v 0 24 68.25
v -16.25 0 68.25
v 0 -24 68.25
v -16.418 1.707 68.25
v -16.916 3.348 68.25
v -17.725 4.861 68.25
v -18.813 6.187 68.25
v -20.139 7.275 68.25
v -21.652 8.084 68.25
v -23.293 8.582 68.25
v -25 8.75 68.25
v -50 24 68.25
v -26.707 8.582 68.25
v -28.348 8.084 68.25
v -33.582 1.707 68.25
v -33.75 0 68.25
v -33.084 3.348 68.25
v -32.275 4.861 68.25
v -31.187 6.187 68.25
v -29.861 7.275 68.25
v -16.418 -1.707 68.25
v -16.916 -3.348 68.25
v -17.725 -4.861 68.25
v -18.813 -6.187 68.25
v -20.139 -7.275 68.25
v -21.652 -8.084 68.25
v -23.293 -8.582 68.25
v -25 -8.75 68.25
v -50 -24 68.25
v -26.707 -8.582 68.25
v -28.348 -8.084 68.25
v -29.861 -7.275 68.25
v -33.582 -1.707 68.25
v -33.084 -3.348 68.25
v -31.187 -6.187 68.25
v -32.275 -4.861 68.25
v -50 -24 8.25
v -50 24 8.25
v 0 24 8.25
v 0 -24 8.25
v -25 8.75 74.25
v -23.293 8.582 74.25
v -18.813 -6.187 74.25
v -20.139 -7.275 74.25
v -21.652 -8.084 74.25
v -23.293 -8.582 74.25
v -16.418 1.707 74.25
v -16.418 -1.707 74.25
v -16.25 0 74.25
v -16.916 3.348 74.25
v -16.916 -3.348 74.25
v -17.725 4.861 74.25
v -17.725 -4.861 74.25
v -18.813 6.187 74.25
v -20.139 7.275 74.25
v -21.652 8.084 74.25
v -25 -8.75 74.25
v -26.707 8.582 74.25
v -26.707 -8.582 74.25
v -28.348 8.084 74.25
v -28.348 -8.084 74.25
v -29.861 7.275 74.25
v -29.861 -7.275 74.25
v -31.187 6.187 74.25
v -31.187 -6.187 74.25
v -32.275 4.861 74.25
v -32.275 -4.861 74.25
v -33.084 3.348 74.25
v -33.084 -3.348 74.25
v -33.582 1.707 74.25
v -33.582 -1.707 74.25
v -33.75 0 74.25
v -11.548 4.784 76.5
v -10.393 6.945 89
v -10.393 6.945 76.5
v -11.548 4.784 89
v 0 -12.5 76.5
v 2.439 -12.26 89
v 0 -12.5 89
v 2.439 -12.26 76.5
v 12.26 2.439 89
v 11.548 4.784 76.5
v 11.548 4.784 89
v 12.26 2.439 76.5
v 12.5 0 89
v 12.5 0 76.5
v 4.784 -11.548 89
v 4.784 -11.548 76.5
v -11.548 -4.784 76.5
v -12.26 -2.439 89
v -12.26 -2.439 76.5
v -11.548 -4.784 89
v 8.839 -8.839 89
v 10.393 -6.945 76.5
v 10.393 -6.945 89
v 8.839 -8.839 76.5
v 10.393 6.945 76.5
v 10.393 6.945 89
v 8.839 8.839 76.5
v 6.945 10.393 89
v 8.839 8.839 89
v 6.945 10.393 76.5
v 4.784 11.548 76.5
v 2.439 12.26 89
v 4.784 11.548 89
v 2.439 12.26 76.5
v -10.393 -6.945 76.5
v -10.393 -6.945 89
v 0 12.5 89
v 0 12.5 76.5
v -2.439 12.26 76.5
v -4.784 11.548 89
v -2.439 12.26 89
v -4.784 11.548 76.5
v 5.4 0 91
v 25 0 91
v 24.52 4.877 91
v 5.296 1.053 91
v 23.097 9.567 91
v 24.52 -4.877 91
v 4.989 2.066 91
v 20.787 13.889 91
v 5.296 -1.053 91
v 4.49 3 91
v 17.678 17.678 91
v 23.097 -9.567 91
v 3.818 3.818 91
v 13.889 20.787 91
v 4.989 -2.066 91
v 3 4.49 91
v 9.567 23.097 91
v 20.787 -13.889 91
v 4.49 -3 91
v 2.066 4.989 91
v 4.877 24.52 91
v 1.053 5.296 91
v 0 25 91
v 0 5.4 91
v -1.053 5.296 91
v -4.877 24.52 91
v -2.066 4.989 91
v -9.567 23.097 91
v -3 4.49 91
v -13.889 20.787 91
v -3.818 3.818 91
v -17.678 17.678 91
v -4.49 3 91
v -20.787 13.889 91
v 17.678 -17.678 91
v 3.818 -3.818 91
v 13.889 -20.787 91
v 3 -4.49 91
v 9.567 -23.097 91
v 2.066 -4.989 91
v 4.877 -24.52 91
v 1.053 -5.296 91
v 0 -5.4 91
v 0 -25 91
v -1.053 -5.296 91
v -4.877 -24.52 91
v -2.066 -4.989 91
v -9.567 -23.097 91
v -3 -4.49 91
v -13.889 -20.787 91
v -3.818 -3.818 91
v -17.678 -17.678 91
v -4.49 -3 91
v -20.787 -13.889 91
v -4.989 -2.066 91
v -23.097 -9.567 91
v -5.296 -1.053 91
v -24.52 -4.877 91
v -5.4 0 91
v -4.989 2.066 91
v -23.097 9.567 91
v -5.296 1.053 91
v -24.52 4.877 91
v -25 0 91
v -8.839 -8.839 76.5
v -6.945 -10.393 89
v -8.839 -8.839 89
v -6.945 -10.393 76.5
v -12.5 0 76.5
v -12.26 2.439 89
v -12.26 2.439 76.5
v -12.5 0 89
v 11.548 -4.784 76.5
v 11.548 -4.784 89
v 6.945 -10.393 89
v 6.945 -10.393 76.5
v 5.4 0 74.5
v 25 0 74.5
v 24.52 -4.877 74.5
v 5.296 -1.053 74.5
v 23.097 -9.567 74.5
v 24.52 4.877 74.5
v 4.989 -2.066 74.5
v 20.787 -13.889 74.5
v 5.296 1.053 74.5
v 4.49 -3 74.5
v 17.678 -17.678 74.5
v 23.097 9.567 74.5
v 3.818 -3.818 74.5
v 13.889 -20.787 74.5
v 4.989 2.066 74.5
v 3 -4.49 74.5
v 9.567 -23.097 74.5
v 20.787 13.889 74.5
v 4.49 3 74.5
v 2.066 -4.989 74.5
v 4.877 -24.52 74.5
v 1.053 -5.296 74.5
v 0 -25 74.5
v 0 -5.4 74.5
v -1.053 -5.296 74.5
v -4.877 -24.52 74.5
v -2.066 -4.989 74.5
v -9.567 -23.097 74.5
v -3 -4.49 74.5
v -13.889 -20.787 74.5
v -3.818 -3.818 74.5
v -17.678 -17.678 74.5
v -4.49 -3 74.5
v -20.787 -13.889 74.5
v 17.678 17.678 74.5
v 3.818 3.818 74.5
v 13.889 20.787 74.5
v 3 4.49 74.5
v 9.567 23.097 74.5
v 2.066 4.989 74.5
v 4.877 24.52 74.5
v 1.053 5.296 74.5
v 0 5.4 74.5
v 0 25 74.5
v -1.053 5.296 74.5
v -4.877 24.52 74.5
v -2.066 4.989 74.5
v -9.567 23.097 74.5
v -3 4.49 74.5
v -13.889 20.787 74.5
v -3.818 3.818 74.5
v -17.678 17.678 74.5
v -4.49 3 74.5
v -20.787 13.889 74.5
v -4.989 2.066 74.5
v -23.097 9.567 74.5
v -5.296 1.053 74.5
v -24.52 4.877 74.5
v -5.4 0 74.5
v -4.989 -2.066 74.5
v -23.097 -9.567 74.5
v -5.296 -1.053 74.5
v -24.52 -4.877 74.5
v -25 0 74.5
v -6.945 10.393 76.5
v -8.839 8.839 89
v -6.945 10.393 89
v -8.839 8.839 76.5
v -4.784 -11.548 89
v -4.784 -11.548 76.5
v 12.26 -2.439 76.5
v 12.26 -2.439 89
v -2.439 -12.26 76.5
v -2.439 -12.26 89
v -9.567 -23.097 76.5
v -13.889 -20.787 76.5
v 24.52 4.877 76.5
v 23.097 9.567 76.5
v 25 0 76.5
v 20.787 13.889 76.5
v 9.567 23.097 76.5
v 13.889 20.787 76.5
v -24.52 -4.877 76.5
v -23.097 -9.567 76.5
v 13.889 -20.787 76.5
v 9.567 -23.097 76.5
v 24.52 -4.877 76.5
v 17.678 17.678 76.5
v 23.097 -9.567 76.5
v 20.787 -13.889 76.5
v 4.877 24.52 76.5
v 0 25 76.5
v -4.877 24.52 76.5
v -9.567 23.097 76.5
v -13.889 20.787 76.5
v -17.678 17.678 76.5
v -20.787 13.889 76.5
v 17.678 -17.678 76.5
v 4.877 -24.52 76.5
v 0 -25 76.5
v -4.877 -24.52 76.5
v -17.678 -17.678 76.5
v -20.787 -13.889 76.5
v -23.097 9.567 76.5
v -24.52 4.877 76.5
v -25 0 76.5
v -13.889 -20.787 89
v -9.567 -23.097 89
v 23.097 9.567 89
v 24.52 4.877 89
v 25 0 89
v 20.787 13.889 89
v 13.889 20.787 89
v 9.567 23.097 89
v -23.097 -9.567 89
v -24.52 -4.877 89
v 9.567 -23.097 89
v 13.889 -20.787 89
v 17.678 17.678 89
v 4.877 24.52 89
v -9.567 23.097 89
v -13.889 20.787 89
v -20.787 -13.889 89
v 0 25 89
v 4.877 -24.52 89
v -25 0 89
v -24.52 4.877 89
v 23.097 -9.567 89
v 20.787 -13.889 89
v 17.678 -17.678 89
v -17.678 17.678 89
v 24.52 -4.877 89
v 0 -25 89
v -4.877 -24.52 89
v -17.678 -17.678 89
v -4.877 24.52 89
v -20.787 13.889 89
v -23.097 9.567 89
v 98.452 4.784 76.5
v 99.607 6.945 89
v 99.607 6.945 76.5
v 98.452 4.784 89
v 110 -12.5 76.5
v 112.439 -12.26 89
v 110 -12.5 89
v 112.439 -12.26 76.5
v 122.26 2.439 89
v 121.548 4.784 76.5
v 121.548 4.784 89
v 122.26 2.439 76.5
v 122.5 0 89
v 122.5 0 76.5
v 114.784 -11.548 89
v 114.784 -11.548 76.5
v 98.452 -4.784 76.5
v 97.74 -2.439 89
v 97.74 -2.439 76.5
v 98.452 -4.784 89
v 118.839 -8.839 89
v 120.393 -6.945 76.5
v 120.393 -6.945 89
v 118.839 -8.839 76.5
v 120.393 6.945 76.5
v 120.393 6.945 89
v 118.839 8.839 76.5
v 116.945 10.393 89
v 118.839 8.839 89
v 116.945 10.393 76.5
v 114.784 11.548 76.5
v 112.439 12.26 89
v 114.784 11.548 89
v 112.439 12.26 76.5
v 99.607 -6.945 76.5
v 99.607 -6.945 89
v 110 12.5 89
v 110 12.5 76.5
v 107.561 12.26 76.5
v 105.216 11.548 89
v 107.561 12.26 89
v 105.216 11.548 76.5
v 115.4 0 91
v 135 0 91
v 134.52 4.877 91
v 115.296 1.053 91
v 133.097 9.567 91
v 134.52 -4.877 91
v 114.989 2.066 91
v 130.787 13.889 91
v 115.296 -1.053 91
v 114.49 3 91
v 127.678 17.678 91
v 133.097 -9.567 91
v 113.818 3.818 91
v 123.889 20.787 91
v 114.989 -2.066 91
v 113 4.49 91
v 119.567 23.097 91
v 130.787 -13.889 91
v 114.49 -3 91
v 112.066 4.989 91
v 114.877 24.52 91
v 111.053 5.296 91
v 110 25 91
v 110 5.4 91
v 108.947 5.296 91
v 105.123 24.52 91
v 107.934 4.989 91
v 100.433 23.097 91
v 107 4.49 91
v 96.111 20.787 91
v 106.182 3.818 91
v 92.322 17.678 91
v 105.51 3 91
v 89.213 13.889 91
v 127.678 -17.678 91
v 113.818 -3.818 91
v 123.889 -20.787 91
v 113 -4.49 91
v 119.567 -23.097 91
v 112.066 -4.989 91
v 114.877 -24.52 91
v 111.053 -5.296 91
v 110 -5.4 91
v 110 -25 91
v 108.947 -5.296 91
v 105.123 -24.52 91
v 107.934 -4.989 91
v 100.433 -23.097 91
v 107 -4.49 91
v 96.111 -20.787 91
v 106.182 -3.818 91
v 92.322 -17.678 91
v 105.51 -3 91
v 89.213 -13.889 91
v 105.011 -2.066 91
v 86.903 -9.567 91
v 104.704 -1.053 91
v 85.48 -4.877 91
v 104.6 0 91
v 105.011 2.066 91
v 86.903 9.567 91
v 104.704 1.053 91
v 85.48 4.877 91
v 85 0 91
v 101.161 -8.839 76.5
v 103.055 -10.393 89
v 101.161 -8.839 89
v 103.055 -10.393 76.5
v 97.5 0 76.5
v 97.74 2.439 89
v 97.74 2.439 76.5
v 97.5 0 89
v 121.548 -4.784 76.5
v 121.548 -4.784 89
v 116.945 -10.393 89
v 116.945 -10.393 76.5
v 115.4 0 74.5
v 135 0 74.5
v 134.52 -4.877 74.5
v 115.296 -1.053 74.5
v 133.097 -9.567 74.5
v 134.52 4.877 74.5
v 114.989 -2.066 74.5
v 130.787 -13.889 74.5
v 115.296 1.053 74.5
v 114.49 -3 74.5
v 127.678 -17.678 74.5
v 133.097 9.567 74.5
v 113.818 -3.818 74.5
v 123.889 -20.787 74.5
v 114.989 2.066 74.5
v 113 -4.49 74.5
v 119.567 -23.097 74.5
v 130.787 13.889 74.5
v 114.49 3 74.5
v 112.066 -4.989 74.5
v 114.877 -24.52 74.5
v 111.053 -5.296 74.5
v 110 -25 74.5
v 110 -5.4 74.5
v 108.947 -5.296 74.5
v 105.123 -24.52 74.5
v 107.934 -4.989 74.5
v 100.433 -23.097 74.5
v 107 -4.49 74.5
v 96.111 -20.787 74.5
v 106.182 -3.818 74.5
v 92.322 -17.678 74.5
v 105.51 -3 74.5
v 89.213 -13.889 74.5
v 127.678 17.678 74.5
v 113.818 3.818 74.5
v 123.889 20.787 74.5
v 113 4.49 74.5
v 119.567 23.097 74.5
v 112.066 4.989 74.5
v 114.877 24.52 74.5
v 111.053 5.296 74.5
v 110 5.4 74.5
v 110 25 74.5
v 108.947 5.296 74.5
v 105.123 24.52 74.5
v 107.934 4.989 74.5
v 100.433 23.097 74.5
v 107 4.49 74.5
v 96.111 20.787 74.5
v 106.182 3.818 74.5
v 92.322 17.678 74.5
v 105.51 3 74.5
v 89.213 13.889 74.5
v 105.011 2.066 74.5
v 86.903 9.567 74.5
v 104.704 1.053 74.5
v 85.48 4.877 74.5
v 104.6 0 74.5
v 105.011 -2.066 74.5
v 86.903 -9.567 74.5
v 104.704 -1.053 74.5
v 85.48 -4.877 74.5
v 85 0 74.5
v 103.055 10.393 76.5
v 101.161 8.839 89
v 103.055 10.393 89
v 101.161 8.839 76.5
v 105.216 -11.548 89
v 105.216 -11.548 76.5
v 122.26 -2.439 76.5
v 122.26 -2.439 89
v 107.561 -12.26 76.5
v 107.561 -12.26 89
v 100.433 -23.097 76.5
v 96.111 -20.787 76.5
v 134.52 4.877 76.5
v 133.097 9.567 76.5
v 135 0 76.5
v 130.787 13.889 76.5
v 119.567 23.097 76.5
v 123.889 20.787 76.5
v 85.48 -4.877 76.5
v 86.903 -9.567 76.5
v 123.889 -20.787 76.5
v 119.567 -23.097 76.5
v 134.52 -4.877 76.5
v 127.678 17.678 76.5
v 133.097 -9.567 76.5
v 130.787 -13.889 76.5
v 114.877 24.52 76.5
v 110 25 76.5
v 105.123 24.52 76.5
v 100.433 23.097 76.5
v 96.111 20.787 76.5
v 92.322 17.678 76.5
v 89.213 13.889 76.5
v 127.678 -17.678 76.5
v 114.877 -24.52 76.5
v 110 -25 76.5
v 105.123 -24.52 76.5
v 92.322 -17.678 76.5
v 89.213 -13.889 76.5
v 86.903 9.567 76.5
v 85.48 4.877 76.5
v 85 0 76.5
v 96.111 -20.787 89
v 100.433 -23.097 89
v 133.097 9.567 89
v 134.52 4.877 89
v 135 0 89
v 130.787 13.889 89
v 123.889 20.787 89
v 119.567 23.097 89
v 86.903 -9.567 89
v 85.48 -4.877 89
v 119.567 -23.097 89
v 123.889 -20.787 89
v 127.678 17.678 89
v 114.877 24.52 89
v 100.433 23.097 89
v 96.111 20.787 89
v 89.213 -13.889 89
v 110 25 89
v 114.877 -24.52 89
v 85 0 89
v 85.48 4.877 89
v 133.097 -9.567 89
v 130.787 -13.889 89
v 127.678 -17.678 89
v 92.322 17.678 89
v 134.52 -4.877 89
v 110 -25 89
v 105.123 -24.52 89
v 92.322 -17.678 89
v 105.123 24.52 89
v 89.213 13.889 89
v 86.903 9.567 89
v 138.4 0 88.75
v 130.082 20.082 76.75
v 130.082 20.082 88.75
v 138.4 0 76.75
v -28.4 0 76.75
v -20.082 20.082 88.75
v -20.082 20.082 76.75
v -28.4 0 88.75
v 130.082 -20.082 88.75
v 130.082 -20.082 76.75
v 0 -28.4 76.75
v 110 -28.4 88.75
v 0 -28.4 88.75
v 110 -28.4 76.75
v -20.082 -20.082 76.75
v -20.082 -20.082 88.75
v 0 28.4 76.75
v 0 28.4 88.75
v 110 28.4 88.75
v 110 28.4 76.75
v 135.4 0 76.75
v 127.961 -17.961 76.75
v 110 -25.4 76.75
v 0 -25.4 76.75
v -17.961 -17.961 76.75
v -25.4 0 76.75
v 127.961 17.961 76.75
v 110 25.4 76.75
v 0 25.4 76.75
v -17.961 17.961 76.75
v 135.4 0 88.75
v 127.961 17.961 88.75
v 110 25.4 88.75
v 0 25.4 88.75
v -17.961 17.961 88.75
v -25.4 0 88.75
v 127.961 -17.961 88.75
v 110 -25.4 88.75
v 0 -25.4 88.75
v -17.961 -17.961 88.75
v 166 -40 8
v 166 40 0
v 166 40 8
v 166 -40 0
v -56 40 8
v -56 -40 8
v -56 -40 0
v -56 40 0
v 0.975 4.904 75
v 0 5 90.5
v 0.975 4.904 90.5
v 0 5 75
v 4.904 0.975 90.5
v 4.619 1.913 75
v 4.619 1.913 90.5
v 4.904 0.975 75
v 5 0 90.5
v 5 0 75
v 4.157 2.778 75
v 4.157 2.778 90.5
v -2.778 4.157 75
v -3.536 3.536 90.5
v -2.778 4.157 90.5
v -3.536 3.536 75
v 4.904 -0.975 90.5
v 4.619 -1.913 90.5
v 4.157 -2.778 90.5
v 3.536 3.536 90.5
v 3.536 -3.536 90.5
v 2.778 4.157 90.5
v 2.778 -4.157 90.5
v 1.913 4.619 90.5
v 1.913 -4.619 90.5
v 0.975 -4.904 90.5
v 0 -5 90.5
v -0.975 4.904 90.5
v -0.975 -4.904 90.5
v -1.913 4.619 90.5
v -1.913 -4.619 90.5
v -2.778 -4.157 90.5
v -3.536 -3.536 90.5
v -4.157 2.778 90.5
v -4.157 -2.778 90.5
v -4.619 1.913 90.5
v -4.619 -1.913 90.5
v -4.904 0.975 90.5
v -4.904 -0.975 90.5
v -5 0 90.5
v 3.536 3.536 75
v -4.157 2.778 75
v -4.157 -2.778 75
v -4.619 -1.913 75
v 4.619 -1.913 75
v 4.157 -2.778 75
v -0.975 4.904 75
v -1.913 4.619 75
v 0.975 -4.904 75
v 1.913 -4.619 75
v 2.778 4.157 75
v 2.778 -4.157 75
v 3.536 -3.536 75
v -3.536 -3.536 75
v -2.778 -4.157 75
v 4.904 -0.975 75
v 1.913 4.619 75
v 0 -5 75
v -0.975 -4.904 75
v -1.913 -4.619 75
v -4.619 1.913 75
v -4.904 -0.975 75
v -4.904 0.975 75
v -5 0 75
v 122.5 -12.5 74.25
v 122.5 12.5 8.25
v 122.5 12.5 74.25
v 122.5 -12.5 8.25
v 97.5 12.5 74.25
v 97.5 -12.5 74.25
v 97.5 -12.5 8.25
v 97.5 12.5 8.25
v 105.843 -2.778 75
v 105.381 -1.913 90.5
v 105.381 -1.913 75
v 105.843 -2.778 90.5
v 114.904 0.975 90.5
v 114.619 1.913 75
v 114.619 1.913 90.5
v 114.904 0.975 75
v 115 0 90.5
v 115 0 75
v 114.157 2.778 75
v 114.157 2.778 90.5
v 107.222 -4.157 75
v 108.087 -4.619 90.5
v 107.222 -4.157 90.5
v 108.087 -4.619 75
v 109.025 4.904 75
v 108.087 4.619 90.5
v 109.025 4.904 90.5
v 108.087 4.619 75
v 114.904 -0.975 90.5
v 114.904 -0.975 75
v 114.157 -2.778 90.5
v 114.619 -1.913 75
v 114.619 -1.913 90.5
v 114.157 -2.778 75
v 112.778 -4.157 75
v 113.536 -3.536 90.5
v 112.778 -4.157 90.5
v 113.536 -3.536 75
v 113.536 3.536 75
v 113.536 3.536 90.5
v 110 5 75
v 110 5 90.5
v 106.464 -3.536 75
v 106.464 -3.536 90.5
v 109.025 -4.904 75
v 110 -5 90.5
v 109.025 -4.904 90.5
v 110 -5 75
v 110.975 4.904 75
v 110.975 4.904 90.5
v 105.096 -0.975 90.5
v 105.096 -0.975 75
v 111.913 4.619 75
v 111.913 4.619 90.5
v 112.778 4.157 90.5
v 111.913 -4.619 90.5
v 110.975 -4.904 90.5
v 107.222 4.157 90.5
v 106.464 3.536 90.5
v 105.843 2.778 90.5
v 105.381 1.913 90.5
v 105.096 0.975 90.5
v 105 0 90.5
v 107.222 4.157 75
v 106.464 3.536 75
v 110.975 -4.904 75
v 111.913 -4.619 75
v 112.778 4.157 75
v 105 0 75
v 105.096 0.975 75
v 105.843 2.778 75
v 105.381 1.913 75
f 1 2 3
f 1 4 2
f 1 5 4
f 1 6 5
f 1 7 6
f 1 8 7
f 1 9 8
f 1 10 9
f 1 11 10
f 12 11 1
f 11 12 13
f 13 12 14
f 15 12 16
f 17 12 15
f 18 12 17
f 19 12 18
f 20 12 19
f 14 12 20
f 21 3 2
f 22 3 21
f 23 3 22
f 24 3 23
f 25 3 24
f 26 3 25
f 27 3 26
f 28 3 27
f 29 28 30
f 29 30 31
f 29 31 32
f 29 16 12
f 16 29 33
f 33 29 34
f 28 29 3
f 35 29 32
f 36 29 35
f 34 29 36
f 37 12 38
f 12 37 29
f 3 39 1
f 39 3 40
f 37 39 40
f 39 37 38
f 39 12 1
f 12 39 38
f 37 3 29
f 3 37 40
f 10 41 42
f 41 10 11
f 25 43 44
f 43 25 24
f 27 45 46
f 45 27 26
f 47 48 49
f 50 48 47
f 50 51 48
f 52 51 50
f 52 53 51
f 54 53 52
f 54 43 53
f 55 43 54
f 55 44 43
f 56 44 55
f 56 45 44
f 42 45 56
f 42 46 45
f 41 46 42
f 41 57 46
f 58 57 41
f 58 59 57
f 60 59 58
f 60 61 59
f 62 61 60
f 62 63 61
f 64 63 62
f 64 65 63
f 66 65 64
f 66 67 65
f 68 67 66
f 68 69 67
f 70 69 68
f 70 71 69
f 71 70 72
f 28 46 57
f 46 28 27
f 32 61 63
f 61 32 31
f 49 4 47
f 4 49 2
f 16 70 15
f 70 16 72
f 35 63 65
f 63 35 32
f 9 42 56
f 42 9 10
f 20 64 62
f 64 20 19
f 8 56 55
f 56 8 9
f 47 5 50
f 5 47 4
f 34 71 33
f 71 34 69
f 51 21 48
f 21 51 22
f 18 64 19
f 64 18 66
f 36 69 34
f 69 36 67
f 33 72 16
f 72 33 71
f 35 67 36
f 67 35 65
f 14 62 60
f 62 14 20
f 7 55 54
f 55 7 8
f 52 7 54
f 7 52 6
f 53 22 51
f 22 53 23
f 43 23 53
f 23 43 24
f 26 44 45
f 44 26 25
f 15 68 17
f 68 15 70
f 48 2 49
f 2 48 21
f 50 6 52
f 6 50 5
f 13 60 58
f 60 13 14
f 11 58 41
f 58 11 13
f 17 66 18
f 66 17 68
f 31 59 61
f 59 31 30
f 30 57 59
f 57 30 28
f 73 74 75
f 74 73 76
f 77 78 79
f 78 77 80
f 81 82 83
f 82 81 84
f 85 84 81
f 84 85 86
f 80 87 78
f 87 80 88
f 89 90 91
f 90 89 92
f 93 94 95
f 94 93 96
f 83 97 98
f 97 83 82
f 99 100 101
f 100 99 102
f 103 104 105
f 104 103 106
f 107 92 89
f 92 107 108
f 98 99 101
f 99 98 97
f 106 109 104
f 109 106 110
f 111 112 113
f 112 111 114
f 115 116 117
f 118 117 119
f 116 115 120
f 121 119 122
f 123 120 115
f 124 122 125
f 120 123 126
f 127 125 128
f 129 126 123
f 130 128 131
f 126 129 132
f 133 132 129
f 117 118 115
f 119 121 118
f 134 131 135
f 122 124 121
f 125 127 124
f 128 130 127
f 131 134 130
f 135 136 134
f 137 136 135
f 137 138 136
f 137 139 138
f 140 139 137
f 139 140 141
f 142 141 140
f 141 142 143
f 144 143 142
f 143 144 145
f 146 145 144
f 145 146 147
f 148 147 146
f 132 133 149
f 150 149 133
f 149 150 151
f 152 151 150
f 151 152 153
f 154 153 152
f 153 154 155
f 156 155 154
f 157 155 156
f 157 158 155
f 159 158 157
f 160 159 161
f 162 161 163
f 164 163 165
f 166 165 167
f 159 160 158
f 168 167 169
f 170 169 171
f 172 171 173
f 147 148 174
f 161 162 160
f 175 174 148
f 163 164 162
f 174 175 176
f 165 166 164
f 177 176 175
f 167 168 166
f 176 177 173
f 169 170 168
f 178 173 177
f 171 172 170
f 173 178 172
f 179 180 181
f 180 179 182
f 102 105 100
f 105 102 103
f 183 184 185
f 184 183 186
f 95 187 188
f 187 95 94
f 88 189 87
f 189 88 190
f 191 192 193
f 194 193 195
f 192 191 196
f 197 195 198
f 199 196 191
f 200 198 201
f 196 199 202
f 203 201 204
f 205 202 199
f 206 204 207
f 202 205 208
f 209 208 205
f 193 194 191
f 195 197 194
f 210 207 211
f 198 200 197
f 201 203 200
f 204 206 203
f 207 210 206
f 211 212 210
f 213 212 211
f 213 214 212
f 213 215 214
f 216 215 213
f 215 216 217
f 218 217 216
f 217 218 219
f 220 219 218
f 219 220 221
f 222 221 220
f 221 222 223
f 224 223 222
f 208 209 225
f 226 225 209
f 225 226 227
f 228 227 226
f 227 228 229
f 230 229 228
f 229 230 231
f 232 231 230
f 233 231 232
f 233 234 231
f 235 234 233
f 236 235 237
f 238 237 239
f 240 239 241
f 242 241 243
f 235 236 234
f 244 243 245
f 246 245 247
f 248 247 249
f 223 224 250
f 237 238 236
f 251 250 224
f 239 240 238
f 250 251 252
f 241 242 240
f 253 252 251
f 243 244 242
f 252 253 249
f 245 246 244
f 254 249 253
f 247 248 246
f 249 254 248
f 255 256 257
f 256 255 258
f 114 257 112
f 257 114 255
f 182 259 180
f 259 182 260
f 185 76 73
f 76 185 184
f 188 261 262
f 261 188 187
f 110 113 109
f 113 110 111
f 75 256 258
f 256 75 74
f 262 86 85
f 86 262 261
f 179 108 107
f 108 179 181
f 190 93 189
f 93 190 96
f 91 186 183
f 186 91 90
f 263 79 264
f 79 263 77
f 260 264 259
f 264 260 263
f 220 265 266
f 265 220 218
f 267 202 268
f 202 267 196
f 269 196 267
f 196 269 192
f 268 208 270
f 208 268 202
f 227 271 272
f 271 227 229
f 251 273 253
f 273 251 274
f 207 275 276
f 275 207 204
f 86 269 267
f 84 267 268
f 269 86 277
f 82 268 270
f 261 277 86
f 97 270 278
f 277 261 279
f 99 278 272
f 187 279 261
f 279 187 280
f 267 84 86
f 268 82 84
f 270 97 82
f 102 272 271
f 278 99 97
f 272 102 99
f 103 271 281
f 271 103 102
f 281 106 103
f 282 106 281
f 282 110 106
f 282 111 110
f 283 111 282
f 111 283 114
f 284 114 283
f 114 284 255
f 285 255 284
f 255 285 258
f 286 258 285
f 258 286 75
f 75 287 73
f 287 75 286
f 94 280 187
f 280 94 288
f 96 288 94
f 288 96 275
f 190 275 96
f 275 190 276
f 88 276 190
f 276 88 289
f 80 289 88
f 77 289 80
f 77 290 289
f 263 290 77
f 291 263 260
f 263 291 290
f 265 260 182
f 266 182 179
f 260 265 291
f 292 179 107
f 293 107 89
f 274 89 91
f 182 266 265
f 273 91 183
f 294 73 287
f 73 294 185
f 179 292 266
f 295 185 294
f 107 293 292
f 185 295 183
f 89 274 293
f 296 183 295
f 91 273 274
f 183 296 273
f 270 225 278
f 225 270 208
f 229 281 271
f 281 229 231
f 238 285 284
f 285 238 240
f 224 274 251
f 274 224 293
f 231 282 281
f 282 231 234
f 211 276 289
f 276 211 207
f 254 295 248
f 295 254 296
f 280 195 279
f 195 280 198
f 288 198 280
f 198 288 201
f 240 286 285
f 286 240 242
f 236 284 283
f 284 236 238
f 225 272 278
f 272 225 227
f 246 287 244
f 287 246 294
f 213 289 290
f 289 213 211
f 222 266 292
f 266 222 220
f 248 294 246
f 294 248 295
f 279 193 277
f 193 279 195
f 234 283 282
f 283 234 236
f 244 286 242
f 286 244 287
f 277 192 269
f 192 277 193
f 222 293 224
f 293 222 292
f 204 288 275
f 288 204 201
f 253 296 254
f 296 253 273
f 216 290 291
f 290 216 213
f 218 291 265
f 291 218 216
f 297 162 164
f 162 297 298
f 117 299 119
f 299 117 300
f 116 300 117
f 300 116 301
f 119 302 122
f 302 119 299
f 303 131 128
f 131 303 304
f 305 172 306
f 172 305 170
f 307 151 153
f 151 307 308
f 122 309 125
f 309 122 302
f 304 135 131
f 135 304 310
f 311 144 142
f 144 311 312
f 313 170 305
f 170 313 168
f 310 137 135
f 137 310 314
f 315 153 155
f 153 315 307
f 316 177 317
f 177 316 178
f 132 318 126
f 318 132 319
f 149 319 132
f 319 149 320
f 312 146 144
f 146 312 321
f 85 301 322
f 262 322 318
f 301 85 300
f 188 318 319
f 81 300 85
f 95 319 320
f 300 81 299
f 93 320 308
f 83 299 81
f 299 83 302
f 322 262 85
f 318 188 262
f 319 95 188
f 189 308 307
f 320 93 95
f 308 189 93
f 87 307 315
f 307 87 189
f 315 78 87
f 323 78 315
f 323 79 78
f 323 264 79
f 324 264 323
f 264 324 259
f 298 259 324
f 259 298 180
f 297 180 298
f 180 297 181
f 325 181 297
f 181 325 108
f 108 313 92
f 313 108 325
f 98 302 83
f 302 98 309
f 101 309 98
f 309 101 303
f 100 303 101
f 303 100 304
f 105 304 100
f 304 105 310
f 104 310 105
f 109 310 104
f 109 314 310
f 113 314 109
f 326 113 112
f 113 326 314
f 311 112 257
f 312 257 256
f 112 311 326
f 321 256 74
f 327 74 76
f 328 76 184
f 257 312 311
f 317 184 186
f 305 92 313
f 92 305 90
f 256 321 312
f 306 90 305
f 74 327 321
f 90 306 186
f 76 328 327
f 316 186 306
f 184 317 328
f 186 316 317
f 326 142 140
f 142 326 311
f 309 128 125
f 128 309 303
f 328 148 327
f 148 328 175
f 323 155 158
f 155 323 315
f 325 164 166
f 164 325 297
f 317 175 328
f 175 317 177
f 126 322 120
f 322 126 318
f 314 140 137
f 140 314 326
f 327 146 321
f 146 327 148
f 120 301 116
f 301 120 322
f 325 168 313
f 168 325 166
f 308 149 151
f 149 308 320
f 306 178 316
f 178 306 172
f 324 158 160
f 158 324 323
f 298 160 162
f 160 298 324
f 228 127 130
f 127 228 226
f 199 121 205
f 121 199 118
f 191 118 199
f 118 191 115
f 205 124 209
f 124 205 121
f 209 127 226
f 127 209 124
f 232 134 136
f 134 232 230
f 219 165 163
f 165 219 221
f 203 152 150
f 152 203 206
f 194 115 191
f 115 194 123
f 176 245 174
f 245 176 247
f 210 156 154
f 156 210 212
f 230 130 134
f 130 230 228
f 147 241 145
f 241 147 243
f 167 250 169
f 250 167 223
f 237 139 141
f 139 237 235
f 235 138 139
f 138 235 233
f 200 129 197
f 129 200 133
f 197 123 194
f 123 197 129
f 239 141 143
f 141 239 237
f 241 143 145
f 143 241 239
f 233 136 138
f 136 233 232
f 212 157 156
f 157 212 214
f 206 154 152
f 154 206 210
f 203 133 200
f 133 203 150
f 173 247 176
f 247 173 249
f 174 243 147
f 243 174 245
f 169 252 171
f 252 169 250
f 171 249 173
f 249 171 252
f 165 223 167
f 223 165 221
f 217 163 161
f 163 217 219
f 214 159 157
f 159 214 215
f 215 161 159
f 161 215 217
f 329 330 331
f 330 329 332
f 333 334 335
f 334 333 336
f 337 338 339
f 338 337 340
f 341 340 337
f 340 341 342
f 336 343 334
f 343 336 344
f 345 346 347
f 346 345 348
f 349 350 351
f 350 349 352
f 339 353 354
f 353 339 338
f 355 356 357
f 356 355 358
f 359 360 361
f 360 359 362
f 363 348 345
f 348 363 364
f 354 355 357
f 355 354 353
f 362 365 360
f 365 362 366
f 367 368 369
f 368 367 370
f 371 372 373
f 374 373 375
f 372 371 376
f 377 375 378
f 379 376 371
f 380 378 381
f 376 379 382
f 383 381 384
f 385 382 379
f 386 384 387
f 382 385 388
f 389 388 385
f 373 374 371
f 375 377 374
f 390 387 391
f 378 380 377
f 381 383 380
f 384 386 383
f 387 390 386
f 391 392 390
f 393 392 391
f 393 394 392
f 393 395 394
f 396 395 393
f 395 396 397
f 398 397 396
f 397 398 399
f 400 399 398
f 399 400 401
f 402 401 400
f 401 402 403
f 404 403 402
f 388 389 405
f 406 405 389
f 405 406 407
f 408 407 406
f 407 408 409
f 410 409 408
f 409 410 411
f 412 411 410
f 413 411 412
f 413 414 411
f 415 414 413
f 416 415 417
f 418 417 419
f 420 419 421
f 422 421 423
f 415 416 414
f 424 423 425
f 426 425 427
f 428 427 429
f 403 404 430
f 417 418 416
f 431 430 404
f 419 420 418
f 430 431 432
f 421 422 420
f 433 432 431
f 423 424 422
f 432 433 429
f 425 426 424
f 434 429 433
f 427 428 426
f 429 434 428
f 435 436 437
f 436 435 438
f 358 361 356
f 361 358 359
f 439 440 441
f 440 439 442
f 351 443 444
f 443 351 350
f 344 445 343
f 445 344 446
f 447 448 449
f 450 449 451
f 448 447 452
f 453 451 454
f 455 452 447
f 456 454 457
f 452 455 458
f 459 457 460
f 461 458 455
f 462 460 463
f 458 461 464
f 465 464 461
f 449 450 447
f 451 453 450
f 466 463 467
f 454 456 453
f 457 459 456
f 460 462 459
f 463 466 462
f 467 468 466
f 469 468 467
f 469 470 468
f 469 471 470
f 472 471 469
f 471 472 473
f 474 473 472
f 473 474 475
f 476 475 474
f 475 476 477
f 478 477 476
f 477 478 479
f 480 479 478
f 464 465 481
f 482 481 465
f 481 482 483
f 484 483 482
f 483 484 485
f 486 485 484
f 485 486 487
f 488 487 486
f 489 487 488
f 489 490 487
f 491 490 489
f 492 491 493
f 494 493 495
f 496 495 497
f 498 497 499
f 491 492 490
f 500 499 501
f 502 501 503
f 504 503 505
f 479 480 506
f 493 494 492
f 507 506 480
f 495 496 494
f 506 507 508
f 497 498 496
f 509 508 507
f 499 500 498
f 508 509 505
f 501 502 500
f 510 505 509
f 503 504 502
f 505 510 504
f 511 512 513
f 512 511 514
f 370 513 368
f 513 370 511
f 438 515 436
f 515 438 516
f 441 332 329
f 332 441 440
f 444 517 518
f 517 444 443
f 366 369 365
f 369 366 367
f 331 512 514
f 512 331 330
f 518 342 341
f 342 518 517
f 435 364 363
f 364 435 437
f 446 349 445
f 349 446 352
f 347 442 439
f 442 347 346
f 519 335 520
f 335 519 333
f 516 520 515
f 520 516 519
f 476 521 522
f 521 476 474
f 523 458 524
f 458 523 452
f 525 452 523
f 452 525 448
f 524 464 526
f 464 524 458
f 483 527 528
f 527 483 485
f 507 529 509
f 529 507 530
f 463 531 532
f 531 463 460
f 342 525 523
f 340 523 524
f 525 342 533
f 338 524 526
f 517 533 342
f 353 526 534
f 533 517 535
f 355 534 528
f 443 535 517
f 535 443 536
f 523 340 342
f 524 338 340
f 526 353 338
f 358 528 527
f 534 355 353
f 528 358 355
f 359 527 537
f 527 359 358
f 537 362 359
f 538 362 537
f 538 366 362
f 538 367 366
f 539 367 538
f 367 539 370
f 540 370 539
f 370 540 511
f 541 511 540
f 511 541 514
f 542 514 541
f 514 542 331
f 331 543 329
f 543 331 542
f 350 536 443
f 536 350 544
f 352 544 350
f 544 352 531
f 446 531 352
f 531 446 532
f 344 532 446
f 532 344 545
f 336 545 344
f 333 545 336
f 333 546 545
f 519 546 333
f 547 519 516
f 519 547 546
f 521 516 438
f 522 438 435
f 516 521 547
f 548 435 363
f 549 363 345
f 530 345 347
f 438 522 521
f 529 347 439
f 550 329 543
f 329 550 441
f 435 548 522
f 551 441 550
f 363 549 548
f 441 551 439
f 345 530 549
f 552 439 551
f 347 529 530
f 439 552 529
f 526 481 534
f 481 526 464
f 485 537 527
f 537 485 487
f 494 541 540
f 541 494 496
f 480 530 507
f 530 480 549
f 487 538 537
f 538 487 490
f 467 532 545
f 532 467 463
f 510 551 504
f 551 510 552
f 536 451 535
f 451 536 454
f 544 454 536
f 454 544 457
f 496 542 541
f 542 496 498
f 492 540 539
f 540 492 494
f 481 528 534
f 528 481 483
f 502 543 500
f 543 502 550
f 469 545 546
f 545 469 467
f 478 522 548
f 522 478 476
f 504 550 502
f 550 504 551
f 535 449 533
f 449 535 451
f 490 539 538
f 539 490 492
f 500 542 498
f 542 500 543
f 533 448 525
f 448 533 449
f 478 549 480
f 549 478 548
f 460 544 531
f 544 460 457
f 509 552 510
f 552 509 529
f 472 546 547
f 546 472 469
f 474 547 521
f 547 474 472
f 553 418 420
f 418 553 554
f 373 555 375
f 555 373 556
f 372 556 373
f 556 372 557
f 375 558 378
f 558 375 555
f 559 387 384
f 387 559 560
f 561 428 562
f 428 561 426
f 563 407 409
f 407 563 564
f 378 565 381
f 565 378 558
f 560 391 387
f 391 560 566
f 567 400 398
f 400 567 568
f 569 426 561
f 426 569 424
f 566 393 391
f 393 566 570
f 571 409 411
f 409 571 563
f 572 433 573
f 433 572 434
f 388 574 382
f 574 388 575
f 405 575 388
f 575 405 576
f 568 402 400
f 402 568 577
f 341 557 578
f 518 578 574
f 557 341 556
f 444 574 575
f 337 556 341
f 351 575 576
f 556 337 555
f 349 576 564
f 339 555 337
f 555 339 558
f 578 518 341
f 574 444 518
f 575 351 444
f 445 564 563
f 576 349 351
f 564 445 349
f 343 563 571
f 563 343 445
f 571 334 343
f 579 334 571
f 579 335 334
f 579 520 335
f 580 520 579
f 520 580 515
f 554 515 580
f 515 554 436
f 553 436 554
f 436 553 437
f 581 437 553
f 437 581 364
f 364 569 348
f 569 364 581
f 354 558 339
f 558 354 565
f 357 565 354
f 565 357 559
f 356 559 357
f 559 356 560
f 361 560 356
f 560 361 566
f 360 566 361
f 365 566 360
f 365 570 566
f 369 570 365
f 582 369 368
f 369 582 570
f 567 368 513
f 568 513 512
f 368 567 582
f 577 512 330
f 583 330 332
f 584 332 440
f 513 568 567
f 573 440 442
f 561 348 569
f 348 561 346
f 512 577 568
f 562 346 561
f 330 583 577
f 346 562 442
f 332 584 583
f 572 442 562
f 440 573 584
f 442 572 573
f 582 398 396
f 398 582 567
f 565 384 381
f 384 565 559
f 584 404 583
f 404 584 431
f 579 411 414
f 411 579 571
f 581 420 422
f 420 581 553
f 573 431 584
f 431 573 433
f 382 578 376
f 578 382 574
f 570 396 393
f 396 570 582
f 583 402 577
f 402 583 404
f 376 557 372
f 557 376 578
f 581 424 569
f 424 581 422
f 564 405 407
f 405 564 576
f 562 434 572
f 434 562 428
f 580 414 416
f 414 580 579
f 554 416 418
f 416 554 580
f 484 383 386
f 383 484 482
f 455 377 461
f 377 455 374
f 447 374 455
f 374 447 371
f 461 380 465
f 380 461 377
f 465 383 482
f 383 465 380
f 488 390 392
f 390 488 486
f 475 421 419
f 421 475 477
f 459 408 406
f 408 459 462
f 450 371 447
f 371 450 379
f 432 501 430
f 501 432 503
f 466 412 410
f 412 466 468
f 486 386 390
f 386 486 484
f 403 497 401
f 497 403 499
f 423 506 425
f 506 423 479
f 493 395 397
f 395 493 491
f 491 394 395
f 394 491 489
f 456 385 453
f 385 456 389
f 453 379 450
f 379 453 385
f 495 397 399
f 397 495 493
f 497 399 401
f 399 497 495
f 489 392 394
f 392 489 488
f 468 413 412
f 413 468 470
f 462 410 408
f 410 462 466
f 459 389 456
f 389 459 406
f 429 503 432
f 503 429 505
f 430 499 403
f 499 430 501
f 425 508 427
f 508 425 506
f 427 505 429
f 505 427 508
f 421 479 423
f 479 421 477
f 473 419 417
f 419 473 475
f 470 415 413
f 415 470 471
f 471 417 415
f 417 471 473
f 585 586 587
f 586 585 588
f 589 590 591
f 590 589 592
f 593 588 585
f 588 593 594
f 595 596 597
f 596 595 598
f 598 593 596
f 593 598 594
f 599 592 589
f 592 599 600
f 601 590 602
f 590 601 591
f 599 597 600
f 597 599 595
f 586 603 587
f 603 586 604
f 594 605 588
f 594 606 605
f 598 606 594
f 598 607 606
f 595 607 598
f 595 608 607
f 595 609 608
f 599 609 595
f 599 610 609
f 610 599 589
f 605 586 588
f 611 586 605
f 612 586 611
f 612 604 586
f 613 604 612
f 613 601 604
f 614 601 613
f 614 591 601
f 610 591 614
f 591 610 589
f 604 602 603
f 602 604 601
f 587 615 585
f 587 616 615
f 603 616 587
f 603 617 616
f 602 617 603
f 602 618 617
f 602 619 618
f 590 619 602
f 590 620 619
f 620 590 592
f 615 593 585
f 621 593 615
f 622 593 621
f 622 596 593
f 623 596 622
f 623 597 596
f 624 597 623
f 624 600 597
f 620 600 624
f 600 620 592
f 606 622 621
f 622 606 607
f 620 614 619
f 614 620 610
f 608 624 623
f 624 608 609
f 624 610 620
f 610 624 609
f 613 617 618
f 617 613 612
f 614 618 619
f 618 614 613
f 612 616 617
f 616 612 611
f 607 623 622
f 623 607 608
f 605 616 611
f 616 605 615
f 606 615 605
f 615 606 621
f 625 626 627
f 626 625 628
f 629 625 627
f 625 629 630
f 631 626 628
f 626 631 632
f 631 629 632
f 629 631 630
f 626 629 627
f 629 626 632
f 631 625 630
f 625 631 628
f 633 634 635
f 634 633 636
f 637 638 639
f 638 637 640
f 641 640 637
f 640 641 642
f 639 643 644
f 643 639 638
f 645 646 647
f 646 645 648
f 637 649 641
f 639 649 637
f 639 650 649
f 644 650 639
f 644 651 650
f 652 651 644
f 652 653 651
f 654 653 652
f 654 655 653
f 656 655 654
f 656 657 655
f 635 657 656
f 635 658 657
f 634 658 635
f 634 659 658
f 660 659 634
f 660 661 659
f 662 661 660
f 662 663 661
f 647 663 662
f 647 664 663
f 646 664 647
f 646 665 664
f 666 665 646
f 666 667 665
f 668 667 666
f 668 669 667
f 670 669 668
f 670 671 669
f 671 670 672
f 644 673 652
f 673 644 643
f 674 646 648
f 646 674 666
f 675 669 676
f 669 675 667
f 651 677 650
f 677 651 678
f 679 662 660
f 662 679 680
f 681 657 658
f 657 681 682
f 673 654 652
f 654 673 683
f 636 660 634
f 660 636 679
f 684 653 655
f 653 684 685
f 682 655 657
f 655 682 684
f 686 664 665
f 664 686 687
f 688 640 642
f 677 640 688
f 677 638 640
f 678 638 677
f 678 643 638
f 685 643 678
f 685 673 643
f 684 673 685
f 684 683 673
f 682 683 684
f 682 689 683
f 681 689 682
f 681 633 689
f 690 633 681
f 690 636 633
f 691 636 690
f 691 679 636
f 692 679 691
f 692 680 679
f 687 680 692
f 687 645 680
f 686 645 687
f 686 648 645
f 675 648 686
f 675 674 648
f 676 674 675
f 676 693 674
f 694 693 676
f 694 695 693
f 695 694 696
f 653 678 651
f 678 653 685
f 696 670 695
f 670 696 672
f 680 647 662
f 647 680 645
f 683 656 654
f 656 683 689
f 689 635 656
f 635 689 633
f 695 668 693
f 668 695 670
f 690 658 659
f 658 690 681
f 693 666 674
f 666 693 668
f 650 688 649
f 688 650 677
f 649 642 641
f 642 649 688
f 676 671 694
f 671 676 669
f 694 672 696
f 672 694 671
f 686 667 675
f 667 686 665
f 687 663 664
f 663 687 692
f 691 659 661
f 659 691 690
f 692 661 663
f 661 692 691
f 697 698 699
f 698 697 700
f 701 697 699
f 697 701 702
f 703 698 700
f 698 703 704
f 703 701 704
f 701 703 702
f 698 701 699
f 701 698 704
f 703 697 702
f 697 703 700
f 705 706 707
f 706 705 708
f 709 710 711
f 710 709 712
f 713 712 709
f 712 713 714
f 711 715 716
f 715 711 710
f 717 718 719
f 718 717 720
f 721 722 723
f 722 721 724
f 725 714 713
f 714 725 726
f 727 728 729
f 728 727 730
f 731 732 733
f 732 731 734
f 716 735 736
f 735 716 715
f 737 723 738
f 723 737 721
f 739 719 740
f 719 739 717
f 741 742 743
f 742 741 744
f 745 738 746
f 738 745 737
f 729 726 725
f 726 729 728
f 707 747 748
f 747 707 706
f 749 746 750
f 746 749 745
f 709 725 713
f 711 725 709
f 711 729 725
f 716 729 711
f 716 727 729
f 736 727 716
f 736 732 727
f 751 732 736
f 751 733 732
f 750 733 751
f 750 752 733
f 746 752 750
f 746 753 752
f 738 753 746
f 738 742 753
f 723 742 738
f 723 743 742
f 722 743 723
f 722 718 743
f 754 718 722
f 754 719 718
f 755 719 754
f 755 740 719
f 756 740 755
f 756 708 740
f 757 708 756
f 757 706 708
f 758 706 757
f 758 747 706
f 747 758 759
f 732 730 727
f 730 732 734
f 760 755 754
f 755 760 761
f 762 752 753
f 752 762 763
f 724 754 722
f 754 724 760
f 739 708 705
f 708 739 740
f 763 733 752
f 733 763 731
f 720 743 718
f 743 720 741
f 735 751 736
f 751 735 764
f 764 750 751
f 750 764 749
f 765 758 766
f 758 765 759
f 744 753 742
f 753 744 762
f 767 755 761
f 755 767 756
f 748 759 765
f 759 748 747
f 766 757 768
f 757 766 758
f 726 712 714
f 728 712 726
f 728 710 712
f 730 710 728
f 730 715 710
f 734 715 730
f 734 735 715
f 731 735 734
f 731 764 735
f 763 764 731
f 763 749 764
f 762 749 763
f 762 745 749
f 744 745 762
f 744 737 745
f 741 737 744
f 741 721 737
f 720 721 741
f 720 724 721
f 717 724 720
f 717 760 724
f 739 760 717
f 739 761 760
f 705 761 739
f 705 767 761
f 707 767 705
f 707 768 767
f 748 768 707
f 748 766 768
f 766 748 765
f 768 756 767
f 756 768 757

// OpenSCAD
$fn = 32;

// ------------------------------------------------------------------------
// Motor belt drive: span 110 mm, pulleys d50, belt 12 mm wide
// Every part is its own module, assembly() places every instance.
// ------------------------------------------------------------------------

// --- part 1 ---
module base_plate() {
  difference() {
    translate([-111, -40, 0]) cube([222, 80, 8]);
  }
}

// --- part 2 ---
module motor() {
  union() {
    translate([-30, -24, 0]) cube([60, 48, 50]);
    translate([33, 0, 25]) rotate([0, 90, 0]) cylinder(h = 6, d = 17.5, center = true);
  }
}

// --- part 3 ---
module drive_shaft() {
  translate([0, 0, -7.75]) cylinder(h = 15.5, d = 10);
}

// --- part 4 ---
module pulley_drive() {
  difference() {
    union() {
      cylinder(h = 16.5, d = 25);
      cylinder(h = 2, d = 50);
      translate([0, 0, 14.5]) cylinder(h = 2, d = 50);
    }
    translate([0, 0, -1]) cylinder(h = 18.5, d = 10.8);
  }
}

// --- part 5 ---
module idler_post() {
  translate([-12.5, -12.5, 0]) cube([25, 25, 66]);
}

// --- part 6 ---
module driven_shaft() {
  translate([0, 0, -7.75]) cylinder(h = 15.5, d = 10);
}

// --- part 7 ---
module pulley_driven() {
  difference() {
    union() {
      cylinder(h = 16.5, d = 25);
      cylinder(h = 2, d = 50);
      translate([0, 0, 14.5]) cylinder(h = 2, d = 50);
    }
    translate([0, 0, -1]) cylinder(h = 18.5, d = 10.8);
  }
}

// --- part 8 ---
module drive_belt() {
  difference() {
    linear_extrude(height = 12) polygon(points = concat([for (a = [90 : 45 : 270]) [28.4 * cos(a), 28.4 * sin(a)]], [for (a = [270 : 45 : 450]) [110 + 28.4 * cos(a), 28.4 * sin(a)]]));
    translate([0, 0, -1]) linear_extrude(height = 14) polygon(points = concat([for (a = [90 : 45 : 270]) [25.4 * cos(a), 25.4 * sin(a)]], [for (a = [270 : 45 : 450]) [110 + 25.4 * cos(a), 25.4 * sin(a)]]));
  }
}

// --- assembly ---
module assembly() {
  color([0.80, 0.24, 0.20]) translate([55, 0, 0]) rotate([0, 0, 0]) base_plate();
  color([0.20, 0.45, 0.75]) translate([0, 0, 38.25]) rotate([0, 270, 0]) motor();
  color([0.25, 0.62, 0.32]) translate([0, 0, 82.75]) rotate([0, 0, 0]) drive_shaft();
  color([0.92, 0.70, 0.18]) translate([0, 0, 74.5]) rotate([0, 0, 0]) pulley_drive();
  color([0.58, 0.35, 0.70]) translate([110, 0, 8.25]) rotate([0, 0, 0]) idler_post();
  color([0.16, 0.66, 0.66]) translate([110, 0, 82.75]) rotate([0, 0, 0]) driven_shaft();
  color([0.85, 0.48, 0.18]) translate([110, 0, 74.5]) rotate([0, 0, 0]) pulley_driven();
  color([0.55, 0.60, 0.65]) translate([0, 0, 76.75]) rotate([0, 0, 0]) drive_belt();
}

assembly();
